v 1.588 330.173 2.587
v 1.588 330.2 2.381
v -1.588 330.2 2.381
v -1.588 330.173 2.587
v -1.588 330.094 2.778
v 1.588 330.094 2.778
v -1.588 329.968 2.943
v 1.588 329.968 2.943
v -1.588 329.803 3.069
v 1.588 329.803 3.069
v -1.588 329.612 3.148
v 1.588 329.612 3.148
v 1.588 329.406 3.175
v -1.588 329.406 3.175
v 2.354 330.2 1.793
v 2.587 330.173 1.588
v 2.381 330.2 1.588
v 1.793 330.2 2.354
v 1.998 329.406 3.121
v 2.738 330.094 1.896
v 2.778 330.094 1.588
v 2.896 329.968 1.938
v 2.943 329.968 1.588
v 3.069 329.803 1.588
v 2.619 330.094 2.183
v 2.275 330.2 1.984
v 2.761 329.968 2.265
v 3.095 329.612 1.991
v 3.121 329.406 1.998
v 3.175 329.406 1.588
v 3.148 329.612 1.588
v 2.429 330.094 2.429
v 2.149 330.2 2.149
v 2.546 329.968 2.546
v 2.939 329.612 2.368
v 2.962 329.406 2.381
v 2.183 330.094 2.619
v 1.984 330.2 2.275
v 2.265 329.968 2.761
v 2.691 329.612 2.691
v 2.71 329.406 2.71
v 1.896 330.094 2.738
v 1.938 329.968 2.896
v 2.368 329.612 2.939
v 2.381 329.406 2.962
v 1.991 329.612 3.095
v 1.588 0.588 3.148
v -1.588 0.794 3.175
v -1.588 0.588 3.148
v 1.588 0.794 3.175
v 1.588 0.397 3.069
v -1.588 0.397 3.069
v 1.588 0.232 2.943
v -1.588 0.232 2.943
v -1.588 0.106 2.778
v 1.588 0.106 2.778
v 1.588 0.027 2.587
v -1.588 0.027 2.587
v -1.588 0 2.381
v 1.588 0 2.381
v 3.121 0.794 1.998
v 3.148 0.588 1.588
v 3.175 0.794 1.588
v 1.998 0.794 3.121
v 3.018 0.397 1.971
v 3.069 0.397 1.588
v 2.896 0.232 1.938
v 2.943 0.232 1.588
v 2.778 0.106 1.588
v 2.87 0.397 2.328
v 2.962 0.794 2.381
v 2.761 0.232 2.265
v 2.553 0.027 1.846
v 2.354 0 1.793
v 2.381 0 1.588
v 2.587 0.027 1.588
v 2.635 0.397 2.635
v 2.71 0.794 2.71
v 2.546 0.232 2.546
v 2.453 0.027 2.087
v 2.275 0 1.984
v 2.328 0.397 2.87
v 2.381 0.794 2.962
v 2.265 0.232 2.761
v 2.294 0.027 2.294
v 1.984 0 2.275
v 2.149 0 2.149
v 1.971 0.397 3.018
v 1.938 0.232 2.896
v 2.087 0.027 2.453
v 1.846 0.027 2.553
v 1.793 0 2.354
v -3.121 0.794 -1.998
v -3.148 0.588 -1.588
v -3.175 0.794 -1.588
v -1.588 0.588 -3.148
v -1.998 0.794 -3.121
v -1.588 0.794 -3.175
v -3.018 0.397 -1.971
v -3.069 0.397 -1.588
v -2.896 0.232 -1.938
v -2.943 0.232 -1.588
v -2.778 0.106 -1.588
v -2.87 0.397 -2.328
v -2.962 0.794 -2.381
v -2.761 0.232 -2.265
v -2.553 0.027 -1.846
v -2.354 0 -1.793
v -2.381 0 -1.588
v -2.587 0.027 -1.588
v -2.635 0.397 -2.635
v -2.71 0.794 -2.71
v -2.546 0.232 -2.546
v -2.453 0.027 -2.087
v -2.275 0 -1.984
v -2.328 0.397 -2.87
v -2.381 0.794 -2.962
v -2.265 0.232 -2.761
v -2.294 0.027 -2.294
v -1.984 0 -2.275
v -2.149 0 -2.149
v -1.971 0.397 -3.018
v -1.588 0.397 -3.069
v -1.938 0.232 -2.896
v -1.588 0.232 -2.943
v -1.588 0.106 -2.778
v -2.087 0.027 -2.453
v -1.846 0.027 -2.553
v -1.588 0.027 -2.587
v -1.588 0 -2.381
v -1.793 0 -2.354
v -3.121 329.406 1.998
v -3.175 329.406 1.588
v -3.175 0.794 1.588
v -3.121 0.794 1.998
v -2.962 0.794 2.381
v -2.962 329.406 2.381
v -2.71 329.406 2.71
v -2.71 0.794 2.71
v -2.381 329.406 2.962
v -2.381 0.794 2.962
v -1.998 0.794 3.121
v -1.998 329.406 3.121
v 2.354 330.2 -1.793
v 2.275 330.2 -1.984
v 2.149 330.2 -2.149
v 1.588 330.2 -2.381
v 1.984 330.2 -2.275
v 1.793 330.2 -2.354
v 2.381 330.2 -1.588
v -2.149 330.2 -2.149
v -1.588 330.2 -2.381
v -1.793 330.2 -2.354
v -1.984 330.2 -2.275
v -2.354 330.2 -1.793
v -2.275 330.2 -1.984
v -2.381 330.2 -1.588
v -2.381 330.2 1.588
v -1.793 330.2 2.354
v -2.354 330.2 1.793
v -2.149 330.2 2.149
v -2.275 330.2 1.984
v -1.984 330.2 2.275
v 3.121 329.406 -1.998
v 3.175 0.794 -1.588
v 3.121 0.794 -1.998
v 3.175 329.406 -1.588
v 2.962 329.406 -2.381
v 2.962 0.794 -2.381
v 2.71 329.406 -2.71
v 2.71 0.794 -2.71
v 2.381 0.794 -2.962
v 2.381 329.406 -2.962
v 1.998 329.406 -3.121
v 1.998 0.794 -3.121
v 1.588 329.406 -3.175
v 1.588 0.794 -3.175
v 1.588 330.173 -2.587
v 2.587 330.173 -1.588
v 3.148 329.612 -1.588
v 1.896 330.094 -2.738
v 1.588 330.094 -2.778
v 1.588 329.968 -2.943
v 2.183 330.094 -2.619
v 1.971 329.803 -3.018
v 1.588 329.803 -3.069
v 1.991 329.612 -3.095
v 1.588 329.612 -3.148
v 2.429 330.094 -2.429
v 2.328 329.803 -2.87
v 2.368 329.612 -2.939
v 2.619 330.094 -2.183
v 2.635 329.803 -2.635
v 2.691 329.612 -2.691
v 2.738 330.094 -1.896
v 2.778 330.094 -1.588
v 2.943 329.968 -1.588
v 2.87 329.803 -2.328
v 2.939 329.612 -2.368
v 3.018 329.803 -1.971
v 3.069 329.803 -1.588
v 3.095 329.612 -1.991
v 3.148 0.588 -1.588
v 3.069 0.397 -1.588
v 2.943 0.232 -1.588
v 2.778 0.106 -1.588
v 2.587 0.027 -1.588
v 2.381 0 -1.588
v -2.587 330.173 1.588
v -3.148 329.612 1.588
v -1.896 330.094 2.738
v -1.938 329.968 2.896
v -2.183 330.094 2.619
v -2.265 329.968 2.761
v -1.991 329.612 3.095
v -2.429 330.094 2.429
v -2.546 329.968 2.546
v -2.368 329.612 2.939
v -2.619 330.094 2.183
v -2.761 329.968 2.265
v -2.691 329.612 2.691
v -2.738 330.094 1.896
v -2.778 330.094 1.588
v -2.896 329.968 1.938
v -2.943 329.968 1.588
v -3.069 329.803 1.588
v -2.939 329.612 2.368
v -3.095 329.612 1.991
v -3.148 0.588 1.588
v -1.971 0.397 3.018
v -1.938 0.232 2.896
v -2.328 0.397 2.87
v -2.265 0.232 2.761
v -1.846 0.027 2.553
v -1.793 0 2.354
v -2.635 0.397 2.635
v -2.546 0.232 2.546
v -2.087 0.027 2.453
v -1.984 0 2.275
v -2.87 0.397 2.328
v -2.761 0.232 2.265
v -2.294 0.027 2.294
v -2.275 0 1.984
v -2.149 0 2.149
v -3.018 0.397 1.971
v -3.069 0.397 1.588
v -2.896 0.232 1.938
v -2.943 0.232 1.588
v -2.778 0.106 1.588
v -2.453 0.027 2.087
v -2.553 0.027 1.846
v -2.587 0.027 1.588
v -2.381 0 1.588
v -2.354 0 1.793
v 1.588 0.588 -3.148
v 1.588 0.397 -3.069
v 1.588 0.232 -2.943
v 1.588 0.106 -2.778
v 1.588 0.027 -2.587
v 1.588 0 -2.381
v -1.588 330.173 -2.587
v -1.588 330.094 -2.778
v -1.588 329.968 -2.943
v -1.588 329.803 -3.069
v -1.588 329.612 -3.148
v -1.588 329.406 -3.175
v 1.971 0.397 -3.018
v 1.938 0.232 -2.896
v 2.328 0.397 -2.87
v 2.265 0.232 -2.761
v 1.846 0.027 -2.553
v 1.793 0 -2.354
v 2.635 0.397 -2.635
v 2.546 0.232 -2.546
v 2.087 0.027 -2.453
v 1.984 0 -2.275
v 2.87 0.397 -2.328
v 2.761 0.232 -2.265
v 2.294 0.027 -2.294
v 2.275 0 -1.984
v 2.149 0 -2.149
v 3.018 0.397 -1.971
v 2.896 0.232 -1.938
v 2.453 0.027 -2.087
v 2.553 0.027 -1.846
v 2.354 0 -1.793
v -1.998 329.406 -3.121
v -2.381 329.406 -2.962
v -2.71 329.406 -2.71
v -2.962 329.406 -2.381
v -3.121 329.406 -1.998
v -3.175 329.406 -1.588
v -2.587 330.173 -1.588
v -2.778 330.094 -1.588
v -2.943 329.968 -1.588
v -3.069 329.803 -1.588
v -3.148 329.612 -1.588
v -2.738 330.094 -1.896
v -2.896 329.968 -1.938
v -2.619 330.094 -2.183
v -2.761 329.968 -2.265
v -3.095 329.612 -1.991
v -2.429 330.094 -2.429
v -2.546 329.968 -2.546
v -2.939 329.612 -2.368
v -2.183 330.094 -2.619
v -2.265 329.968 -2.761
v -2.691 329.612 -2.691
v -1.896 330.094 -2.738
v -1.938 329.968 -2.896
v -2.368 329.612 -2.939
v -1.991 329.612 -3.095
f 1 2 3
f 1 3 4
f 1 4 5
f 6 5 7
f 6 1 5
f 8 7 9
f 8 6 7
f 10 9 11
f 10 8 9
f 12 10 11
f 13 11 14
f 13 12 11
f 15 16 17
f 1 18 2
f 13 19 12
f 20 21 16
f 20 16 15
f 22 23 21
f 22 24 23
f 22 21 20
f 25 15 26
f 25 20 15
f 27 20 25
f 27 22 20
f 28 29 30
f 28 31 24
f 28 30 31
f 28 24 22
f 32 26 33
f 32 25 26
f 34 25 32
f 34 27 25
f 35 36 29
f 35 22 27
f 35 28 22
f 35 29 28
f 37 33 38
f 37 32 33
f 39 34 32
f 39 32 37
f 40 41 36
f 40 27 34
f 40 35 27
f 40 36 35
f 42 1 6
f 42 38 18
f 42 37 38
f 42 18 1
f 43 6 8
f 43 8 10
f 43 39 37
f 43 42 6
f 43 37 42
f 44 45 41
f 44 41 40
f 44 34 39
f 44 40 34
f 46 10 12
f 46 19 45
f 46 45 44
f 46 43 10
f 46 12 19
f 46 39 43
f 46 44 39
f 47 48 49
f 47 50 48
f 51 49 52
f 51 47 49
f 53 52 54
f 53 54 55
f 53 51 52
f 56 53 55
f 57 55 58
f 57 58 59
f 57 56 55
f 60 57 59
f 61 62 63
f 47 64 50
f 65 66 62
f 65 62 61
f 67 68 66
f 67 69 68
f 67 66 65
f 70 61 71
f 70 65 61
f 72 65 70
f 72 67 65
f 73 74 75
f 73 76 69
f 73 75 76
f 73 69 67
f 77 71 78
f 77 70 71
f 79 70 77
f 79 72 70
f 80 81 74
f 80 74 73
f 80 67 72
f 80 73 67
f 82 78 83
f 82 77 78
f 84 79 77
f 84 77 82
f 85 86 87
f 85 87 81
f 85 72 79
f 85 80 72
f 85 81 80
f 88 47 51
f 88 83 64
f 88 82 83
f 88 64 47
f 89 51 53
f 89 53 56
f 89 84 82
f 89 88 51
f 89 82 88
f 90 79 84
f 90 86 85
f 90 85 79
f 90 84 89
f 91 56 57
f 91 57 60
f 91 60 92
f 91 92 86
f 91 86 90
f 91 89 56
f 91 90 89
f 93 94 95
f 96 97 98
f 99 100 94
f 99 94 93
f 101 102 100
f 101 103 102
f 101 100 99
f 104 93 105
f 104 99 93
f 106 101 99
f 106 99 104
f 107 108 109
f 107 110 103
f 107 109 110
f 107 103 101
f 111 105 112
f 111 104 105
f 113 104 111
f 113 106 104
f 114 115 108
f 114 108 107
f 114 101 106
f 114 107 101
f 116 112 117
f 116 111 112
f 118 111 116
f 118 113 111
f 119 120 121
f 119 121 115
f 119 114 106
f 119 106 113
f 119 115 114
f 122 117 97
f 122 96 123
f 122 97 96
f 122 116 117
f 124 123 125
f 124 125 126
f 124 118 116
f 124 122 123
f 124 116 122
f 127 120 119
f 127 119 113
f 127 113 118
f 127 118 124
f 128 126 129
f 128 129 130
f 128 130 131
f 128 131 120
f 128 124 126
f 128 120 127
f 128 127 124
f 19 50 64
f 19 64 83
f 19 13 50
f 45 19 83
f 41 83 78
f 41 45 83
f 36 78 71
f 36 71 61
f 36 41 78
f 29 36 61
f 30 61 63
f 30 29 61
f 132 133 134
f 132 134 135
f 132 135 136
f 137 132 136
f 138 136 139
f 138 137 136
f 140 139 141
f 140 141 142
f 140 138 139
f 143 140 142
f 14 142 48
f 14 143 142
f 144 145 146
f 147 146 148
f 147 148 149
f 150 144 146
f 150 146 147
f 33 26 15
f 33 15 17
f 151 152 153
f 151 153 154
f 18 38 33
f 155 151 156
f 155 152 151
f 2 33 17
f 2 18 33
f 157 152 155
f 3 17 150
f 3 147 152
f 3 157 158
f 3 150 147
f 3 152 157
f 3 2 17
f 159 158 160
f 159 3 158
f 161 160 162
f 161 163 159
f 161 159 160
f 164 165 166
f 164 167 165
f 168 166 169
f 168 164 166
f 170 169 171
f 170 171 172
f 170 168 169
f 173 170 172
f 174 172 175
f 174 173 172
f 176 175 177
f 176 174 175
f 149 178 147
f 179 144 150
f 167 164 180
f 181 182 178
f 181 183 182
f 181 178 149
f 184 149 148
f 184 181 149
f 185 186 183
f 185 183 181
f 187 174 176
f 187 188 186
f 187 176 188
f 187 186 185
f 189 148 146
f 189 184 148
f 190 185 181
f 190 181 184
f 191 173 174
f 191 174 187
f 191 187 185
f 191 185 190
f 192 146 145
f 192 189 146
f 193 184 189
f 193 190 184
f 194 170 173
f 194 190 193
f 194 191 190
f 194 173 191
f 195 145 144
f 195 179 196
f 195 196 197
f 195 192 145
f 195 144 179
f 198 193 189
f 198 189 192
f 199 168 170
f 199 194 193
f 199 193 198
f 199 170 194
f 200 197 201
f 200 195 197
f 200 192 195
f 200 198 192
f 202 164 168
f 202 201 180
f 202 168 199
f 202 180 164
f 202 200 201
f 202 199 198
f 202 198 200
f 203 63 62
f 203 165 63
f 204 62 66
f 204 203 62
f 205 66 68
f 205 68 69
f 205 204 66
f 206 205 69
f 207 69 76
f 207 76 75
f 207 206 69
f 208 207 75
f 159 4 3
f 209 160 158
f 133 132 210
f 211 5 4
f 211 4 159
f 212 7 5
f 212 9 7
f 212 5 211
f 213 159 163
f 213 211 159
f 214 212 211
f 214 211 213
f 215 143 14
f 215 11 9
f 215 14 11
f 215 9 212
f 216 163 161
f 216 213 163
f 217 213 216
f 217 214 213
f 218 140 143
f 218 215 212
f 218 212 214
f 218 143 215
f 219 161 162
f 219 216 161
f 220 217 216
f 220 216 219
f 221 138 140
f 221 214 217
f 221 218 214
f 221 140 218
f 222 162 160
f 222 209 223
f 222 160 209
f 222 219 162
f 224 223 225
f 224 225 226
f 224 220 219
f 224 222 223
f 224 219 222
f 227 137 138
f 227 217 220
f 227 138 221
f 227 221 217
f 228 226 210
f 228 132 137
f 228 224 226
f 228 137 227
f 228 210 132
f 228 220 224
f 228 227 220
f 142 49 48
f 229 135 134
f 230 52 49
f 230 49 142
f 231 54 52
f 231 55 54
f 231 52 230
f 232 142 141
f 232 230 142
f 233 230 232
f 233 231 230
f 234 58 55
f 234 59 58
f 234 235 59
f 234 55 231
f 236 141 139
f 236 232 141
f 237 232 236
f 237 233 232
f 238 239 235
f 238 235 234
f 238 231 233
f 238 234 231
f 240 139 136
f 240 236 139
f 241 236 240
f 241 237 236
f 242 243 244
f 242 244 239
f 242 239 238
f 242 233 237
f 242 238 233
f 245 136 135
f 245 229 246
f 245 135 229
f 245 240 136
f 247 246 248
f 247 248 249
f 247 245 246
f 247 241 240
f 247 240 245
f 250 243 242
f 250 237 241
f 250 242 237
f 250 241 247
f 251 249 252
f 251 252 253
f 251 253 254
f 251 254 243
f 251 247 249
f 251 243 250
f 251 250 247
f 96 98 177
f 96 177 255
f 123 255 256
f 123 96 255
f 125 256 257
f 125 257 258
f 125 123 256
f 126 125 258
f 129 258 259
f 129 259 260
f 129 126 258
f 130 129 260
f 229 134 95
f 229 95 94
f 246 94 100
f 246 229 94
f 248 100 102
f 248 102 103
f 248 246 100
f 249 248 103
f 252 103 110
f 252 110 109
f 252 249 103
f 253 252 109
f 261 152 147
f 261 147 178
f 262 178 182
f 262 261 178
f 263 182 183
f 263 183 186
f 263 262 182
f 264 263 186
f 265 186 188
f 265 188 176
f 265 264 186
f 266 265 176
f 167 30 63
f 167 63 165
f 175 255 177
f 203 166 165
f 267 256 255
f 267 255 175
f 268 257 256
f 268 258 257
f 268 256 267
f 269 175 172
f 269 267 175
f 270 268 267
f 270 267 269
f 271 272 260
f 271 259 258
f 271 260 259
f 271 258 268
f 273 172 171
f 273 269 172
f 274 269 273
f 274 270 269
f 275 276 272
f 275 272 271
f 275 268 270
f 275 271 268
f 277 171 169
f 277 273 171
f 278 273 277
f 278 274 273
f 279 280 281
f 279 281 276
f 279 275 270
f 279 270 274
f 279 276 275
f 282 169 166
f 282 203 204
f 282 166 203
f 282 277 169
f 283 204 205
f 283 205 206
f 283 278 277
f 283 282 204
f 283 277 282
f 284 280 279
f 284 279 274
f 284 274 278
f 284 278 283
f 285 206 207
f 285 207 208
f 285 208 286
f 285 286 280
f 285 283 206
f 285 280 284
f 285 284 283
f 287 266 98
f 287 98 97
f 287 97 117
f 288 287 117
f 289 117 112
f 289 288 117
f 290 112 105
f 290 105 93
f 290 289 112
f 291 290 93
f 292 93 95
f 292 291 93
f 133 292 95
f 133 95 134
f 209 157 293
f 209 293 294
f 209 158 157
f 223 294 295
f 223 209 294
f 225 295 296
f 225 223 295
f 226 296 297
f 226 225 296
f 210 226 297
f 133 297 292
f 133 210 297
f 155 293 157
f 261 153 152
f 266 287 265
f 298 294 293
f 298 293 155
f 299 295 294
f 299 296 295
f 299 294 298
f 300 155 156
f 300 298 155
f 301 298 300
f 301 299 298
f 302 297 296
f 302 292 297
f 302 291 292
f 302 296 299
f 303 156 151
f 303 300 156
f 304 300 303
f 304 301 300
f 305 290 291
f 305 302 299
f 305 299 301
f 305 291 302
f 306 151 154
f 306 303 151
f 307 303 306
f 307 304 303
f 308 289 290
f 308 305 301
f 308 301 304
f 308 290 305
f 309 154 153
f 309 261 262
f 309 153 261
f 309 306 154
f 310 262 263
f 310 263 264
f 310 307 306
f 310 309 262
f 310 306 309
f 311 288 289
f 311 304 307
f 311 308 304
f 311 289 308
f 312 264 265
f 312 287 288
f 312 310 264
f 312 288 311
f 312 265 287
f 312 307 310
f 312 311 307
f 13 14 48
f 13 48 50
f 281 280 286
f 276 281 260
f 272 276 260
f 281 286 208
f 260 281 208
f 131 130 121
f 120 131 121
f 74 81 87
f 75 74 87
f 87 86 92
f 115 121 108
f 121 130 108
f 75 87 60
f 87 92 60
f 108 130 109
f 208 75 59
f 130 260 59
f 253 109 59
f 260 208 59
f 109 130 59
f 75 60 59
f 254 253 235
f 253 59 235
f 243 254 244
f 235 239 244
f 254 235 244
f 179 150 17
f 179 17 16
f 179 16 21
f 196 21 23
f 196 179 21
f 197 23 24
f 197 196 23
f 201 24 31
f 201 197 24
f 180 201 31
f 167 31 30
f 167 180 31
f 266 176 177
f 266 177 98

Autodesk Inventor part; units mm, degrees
ref_plane "YZ Plane" through (0, 0, 0) normal (1, 0, 0) x (0, 1, 0)
ref_plane "XZ Plane" through (0, 0, 0) normal (0, 1, 0) x (-1, 0, 0)
ref_plane "XY Plane" through (0, 0, 0) normal (0, 0, 1) x (1, 0, 0)
sketch "Sketch1" plane through (0, 0, 0) normal (0, 1, 0) x (-1, 0, 0)
  line L0 (-3.175, -3.175) -> (3.175, -3.175)
  line L1 (3.175, -3.175) -> (3.175, 3.175)
  line L2 (3.175, 3.175) -> (-3.175, 3.175)
  line L3 (-3.175, 3.175) -> (-3.175, -3.175)
  line L4 (-3.175, -3.175) -> (3.175, 3.175) construction
  line L5 (3.175, -3.175) -> (-3.175, 3.175) construction
  point P0 (0, 0)
  dimension "d0" = 6.35
  dimension "d1" = 6.35
extrude "Extrusion1" add sketch "Sketch1" along normal blind 330.2
fillet "Fillet1" radius 1.5875 4 edges at (-3.175, 165.1, -3.175) (3.175, 165.1, -3.175) (3.175, 165.1, 3.175) (-3.175, 165.1, 3.175)
fillet "Fillet2" radius 0.7937 16 edges at (3.175, 0, 0) (2.71, 0, -2.71) (0, 0, -3.175) (-2.71, 0, -2.71) (-3.175, 0, 0) (-2.71, 0, 2.71) (0, 0, 3.175) (2.71, 0, 2.71) (0, 330.2, -3.175) (2.71, 330.2, -2.71) (3.175, 330.2, 0) (2.71, 330.2, 2.71) (0, 330.2, 3.175) (-2.71, 330.2, 2.71) (-3.175, 330.2, 0) (-2.71, 330.2, -2.71)
ref_plane "Work Plane1" through (0, 165.1, 0) normal (0, 1, 0) x (1, 0, 0)
properties part number "13in hs shaft" material "Stainless Steel"
